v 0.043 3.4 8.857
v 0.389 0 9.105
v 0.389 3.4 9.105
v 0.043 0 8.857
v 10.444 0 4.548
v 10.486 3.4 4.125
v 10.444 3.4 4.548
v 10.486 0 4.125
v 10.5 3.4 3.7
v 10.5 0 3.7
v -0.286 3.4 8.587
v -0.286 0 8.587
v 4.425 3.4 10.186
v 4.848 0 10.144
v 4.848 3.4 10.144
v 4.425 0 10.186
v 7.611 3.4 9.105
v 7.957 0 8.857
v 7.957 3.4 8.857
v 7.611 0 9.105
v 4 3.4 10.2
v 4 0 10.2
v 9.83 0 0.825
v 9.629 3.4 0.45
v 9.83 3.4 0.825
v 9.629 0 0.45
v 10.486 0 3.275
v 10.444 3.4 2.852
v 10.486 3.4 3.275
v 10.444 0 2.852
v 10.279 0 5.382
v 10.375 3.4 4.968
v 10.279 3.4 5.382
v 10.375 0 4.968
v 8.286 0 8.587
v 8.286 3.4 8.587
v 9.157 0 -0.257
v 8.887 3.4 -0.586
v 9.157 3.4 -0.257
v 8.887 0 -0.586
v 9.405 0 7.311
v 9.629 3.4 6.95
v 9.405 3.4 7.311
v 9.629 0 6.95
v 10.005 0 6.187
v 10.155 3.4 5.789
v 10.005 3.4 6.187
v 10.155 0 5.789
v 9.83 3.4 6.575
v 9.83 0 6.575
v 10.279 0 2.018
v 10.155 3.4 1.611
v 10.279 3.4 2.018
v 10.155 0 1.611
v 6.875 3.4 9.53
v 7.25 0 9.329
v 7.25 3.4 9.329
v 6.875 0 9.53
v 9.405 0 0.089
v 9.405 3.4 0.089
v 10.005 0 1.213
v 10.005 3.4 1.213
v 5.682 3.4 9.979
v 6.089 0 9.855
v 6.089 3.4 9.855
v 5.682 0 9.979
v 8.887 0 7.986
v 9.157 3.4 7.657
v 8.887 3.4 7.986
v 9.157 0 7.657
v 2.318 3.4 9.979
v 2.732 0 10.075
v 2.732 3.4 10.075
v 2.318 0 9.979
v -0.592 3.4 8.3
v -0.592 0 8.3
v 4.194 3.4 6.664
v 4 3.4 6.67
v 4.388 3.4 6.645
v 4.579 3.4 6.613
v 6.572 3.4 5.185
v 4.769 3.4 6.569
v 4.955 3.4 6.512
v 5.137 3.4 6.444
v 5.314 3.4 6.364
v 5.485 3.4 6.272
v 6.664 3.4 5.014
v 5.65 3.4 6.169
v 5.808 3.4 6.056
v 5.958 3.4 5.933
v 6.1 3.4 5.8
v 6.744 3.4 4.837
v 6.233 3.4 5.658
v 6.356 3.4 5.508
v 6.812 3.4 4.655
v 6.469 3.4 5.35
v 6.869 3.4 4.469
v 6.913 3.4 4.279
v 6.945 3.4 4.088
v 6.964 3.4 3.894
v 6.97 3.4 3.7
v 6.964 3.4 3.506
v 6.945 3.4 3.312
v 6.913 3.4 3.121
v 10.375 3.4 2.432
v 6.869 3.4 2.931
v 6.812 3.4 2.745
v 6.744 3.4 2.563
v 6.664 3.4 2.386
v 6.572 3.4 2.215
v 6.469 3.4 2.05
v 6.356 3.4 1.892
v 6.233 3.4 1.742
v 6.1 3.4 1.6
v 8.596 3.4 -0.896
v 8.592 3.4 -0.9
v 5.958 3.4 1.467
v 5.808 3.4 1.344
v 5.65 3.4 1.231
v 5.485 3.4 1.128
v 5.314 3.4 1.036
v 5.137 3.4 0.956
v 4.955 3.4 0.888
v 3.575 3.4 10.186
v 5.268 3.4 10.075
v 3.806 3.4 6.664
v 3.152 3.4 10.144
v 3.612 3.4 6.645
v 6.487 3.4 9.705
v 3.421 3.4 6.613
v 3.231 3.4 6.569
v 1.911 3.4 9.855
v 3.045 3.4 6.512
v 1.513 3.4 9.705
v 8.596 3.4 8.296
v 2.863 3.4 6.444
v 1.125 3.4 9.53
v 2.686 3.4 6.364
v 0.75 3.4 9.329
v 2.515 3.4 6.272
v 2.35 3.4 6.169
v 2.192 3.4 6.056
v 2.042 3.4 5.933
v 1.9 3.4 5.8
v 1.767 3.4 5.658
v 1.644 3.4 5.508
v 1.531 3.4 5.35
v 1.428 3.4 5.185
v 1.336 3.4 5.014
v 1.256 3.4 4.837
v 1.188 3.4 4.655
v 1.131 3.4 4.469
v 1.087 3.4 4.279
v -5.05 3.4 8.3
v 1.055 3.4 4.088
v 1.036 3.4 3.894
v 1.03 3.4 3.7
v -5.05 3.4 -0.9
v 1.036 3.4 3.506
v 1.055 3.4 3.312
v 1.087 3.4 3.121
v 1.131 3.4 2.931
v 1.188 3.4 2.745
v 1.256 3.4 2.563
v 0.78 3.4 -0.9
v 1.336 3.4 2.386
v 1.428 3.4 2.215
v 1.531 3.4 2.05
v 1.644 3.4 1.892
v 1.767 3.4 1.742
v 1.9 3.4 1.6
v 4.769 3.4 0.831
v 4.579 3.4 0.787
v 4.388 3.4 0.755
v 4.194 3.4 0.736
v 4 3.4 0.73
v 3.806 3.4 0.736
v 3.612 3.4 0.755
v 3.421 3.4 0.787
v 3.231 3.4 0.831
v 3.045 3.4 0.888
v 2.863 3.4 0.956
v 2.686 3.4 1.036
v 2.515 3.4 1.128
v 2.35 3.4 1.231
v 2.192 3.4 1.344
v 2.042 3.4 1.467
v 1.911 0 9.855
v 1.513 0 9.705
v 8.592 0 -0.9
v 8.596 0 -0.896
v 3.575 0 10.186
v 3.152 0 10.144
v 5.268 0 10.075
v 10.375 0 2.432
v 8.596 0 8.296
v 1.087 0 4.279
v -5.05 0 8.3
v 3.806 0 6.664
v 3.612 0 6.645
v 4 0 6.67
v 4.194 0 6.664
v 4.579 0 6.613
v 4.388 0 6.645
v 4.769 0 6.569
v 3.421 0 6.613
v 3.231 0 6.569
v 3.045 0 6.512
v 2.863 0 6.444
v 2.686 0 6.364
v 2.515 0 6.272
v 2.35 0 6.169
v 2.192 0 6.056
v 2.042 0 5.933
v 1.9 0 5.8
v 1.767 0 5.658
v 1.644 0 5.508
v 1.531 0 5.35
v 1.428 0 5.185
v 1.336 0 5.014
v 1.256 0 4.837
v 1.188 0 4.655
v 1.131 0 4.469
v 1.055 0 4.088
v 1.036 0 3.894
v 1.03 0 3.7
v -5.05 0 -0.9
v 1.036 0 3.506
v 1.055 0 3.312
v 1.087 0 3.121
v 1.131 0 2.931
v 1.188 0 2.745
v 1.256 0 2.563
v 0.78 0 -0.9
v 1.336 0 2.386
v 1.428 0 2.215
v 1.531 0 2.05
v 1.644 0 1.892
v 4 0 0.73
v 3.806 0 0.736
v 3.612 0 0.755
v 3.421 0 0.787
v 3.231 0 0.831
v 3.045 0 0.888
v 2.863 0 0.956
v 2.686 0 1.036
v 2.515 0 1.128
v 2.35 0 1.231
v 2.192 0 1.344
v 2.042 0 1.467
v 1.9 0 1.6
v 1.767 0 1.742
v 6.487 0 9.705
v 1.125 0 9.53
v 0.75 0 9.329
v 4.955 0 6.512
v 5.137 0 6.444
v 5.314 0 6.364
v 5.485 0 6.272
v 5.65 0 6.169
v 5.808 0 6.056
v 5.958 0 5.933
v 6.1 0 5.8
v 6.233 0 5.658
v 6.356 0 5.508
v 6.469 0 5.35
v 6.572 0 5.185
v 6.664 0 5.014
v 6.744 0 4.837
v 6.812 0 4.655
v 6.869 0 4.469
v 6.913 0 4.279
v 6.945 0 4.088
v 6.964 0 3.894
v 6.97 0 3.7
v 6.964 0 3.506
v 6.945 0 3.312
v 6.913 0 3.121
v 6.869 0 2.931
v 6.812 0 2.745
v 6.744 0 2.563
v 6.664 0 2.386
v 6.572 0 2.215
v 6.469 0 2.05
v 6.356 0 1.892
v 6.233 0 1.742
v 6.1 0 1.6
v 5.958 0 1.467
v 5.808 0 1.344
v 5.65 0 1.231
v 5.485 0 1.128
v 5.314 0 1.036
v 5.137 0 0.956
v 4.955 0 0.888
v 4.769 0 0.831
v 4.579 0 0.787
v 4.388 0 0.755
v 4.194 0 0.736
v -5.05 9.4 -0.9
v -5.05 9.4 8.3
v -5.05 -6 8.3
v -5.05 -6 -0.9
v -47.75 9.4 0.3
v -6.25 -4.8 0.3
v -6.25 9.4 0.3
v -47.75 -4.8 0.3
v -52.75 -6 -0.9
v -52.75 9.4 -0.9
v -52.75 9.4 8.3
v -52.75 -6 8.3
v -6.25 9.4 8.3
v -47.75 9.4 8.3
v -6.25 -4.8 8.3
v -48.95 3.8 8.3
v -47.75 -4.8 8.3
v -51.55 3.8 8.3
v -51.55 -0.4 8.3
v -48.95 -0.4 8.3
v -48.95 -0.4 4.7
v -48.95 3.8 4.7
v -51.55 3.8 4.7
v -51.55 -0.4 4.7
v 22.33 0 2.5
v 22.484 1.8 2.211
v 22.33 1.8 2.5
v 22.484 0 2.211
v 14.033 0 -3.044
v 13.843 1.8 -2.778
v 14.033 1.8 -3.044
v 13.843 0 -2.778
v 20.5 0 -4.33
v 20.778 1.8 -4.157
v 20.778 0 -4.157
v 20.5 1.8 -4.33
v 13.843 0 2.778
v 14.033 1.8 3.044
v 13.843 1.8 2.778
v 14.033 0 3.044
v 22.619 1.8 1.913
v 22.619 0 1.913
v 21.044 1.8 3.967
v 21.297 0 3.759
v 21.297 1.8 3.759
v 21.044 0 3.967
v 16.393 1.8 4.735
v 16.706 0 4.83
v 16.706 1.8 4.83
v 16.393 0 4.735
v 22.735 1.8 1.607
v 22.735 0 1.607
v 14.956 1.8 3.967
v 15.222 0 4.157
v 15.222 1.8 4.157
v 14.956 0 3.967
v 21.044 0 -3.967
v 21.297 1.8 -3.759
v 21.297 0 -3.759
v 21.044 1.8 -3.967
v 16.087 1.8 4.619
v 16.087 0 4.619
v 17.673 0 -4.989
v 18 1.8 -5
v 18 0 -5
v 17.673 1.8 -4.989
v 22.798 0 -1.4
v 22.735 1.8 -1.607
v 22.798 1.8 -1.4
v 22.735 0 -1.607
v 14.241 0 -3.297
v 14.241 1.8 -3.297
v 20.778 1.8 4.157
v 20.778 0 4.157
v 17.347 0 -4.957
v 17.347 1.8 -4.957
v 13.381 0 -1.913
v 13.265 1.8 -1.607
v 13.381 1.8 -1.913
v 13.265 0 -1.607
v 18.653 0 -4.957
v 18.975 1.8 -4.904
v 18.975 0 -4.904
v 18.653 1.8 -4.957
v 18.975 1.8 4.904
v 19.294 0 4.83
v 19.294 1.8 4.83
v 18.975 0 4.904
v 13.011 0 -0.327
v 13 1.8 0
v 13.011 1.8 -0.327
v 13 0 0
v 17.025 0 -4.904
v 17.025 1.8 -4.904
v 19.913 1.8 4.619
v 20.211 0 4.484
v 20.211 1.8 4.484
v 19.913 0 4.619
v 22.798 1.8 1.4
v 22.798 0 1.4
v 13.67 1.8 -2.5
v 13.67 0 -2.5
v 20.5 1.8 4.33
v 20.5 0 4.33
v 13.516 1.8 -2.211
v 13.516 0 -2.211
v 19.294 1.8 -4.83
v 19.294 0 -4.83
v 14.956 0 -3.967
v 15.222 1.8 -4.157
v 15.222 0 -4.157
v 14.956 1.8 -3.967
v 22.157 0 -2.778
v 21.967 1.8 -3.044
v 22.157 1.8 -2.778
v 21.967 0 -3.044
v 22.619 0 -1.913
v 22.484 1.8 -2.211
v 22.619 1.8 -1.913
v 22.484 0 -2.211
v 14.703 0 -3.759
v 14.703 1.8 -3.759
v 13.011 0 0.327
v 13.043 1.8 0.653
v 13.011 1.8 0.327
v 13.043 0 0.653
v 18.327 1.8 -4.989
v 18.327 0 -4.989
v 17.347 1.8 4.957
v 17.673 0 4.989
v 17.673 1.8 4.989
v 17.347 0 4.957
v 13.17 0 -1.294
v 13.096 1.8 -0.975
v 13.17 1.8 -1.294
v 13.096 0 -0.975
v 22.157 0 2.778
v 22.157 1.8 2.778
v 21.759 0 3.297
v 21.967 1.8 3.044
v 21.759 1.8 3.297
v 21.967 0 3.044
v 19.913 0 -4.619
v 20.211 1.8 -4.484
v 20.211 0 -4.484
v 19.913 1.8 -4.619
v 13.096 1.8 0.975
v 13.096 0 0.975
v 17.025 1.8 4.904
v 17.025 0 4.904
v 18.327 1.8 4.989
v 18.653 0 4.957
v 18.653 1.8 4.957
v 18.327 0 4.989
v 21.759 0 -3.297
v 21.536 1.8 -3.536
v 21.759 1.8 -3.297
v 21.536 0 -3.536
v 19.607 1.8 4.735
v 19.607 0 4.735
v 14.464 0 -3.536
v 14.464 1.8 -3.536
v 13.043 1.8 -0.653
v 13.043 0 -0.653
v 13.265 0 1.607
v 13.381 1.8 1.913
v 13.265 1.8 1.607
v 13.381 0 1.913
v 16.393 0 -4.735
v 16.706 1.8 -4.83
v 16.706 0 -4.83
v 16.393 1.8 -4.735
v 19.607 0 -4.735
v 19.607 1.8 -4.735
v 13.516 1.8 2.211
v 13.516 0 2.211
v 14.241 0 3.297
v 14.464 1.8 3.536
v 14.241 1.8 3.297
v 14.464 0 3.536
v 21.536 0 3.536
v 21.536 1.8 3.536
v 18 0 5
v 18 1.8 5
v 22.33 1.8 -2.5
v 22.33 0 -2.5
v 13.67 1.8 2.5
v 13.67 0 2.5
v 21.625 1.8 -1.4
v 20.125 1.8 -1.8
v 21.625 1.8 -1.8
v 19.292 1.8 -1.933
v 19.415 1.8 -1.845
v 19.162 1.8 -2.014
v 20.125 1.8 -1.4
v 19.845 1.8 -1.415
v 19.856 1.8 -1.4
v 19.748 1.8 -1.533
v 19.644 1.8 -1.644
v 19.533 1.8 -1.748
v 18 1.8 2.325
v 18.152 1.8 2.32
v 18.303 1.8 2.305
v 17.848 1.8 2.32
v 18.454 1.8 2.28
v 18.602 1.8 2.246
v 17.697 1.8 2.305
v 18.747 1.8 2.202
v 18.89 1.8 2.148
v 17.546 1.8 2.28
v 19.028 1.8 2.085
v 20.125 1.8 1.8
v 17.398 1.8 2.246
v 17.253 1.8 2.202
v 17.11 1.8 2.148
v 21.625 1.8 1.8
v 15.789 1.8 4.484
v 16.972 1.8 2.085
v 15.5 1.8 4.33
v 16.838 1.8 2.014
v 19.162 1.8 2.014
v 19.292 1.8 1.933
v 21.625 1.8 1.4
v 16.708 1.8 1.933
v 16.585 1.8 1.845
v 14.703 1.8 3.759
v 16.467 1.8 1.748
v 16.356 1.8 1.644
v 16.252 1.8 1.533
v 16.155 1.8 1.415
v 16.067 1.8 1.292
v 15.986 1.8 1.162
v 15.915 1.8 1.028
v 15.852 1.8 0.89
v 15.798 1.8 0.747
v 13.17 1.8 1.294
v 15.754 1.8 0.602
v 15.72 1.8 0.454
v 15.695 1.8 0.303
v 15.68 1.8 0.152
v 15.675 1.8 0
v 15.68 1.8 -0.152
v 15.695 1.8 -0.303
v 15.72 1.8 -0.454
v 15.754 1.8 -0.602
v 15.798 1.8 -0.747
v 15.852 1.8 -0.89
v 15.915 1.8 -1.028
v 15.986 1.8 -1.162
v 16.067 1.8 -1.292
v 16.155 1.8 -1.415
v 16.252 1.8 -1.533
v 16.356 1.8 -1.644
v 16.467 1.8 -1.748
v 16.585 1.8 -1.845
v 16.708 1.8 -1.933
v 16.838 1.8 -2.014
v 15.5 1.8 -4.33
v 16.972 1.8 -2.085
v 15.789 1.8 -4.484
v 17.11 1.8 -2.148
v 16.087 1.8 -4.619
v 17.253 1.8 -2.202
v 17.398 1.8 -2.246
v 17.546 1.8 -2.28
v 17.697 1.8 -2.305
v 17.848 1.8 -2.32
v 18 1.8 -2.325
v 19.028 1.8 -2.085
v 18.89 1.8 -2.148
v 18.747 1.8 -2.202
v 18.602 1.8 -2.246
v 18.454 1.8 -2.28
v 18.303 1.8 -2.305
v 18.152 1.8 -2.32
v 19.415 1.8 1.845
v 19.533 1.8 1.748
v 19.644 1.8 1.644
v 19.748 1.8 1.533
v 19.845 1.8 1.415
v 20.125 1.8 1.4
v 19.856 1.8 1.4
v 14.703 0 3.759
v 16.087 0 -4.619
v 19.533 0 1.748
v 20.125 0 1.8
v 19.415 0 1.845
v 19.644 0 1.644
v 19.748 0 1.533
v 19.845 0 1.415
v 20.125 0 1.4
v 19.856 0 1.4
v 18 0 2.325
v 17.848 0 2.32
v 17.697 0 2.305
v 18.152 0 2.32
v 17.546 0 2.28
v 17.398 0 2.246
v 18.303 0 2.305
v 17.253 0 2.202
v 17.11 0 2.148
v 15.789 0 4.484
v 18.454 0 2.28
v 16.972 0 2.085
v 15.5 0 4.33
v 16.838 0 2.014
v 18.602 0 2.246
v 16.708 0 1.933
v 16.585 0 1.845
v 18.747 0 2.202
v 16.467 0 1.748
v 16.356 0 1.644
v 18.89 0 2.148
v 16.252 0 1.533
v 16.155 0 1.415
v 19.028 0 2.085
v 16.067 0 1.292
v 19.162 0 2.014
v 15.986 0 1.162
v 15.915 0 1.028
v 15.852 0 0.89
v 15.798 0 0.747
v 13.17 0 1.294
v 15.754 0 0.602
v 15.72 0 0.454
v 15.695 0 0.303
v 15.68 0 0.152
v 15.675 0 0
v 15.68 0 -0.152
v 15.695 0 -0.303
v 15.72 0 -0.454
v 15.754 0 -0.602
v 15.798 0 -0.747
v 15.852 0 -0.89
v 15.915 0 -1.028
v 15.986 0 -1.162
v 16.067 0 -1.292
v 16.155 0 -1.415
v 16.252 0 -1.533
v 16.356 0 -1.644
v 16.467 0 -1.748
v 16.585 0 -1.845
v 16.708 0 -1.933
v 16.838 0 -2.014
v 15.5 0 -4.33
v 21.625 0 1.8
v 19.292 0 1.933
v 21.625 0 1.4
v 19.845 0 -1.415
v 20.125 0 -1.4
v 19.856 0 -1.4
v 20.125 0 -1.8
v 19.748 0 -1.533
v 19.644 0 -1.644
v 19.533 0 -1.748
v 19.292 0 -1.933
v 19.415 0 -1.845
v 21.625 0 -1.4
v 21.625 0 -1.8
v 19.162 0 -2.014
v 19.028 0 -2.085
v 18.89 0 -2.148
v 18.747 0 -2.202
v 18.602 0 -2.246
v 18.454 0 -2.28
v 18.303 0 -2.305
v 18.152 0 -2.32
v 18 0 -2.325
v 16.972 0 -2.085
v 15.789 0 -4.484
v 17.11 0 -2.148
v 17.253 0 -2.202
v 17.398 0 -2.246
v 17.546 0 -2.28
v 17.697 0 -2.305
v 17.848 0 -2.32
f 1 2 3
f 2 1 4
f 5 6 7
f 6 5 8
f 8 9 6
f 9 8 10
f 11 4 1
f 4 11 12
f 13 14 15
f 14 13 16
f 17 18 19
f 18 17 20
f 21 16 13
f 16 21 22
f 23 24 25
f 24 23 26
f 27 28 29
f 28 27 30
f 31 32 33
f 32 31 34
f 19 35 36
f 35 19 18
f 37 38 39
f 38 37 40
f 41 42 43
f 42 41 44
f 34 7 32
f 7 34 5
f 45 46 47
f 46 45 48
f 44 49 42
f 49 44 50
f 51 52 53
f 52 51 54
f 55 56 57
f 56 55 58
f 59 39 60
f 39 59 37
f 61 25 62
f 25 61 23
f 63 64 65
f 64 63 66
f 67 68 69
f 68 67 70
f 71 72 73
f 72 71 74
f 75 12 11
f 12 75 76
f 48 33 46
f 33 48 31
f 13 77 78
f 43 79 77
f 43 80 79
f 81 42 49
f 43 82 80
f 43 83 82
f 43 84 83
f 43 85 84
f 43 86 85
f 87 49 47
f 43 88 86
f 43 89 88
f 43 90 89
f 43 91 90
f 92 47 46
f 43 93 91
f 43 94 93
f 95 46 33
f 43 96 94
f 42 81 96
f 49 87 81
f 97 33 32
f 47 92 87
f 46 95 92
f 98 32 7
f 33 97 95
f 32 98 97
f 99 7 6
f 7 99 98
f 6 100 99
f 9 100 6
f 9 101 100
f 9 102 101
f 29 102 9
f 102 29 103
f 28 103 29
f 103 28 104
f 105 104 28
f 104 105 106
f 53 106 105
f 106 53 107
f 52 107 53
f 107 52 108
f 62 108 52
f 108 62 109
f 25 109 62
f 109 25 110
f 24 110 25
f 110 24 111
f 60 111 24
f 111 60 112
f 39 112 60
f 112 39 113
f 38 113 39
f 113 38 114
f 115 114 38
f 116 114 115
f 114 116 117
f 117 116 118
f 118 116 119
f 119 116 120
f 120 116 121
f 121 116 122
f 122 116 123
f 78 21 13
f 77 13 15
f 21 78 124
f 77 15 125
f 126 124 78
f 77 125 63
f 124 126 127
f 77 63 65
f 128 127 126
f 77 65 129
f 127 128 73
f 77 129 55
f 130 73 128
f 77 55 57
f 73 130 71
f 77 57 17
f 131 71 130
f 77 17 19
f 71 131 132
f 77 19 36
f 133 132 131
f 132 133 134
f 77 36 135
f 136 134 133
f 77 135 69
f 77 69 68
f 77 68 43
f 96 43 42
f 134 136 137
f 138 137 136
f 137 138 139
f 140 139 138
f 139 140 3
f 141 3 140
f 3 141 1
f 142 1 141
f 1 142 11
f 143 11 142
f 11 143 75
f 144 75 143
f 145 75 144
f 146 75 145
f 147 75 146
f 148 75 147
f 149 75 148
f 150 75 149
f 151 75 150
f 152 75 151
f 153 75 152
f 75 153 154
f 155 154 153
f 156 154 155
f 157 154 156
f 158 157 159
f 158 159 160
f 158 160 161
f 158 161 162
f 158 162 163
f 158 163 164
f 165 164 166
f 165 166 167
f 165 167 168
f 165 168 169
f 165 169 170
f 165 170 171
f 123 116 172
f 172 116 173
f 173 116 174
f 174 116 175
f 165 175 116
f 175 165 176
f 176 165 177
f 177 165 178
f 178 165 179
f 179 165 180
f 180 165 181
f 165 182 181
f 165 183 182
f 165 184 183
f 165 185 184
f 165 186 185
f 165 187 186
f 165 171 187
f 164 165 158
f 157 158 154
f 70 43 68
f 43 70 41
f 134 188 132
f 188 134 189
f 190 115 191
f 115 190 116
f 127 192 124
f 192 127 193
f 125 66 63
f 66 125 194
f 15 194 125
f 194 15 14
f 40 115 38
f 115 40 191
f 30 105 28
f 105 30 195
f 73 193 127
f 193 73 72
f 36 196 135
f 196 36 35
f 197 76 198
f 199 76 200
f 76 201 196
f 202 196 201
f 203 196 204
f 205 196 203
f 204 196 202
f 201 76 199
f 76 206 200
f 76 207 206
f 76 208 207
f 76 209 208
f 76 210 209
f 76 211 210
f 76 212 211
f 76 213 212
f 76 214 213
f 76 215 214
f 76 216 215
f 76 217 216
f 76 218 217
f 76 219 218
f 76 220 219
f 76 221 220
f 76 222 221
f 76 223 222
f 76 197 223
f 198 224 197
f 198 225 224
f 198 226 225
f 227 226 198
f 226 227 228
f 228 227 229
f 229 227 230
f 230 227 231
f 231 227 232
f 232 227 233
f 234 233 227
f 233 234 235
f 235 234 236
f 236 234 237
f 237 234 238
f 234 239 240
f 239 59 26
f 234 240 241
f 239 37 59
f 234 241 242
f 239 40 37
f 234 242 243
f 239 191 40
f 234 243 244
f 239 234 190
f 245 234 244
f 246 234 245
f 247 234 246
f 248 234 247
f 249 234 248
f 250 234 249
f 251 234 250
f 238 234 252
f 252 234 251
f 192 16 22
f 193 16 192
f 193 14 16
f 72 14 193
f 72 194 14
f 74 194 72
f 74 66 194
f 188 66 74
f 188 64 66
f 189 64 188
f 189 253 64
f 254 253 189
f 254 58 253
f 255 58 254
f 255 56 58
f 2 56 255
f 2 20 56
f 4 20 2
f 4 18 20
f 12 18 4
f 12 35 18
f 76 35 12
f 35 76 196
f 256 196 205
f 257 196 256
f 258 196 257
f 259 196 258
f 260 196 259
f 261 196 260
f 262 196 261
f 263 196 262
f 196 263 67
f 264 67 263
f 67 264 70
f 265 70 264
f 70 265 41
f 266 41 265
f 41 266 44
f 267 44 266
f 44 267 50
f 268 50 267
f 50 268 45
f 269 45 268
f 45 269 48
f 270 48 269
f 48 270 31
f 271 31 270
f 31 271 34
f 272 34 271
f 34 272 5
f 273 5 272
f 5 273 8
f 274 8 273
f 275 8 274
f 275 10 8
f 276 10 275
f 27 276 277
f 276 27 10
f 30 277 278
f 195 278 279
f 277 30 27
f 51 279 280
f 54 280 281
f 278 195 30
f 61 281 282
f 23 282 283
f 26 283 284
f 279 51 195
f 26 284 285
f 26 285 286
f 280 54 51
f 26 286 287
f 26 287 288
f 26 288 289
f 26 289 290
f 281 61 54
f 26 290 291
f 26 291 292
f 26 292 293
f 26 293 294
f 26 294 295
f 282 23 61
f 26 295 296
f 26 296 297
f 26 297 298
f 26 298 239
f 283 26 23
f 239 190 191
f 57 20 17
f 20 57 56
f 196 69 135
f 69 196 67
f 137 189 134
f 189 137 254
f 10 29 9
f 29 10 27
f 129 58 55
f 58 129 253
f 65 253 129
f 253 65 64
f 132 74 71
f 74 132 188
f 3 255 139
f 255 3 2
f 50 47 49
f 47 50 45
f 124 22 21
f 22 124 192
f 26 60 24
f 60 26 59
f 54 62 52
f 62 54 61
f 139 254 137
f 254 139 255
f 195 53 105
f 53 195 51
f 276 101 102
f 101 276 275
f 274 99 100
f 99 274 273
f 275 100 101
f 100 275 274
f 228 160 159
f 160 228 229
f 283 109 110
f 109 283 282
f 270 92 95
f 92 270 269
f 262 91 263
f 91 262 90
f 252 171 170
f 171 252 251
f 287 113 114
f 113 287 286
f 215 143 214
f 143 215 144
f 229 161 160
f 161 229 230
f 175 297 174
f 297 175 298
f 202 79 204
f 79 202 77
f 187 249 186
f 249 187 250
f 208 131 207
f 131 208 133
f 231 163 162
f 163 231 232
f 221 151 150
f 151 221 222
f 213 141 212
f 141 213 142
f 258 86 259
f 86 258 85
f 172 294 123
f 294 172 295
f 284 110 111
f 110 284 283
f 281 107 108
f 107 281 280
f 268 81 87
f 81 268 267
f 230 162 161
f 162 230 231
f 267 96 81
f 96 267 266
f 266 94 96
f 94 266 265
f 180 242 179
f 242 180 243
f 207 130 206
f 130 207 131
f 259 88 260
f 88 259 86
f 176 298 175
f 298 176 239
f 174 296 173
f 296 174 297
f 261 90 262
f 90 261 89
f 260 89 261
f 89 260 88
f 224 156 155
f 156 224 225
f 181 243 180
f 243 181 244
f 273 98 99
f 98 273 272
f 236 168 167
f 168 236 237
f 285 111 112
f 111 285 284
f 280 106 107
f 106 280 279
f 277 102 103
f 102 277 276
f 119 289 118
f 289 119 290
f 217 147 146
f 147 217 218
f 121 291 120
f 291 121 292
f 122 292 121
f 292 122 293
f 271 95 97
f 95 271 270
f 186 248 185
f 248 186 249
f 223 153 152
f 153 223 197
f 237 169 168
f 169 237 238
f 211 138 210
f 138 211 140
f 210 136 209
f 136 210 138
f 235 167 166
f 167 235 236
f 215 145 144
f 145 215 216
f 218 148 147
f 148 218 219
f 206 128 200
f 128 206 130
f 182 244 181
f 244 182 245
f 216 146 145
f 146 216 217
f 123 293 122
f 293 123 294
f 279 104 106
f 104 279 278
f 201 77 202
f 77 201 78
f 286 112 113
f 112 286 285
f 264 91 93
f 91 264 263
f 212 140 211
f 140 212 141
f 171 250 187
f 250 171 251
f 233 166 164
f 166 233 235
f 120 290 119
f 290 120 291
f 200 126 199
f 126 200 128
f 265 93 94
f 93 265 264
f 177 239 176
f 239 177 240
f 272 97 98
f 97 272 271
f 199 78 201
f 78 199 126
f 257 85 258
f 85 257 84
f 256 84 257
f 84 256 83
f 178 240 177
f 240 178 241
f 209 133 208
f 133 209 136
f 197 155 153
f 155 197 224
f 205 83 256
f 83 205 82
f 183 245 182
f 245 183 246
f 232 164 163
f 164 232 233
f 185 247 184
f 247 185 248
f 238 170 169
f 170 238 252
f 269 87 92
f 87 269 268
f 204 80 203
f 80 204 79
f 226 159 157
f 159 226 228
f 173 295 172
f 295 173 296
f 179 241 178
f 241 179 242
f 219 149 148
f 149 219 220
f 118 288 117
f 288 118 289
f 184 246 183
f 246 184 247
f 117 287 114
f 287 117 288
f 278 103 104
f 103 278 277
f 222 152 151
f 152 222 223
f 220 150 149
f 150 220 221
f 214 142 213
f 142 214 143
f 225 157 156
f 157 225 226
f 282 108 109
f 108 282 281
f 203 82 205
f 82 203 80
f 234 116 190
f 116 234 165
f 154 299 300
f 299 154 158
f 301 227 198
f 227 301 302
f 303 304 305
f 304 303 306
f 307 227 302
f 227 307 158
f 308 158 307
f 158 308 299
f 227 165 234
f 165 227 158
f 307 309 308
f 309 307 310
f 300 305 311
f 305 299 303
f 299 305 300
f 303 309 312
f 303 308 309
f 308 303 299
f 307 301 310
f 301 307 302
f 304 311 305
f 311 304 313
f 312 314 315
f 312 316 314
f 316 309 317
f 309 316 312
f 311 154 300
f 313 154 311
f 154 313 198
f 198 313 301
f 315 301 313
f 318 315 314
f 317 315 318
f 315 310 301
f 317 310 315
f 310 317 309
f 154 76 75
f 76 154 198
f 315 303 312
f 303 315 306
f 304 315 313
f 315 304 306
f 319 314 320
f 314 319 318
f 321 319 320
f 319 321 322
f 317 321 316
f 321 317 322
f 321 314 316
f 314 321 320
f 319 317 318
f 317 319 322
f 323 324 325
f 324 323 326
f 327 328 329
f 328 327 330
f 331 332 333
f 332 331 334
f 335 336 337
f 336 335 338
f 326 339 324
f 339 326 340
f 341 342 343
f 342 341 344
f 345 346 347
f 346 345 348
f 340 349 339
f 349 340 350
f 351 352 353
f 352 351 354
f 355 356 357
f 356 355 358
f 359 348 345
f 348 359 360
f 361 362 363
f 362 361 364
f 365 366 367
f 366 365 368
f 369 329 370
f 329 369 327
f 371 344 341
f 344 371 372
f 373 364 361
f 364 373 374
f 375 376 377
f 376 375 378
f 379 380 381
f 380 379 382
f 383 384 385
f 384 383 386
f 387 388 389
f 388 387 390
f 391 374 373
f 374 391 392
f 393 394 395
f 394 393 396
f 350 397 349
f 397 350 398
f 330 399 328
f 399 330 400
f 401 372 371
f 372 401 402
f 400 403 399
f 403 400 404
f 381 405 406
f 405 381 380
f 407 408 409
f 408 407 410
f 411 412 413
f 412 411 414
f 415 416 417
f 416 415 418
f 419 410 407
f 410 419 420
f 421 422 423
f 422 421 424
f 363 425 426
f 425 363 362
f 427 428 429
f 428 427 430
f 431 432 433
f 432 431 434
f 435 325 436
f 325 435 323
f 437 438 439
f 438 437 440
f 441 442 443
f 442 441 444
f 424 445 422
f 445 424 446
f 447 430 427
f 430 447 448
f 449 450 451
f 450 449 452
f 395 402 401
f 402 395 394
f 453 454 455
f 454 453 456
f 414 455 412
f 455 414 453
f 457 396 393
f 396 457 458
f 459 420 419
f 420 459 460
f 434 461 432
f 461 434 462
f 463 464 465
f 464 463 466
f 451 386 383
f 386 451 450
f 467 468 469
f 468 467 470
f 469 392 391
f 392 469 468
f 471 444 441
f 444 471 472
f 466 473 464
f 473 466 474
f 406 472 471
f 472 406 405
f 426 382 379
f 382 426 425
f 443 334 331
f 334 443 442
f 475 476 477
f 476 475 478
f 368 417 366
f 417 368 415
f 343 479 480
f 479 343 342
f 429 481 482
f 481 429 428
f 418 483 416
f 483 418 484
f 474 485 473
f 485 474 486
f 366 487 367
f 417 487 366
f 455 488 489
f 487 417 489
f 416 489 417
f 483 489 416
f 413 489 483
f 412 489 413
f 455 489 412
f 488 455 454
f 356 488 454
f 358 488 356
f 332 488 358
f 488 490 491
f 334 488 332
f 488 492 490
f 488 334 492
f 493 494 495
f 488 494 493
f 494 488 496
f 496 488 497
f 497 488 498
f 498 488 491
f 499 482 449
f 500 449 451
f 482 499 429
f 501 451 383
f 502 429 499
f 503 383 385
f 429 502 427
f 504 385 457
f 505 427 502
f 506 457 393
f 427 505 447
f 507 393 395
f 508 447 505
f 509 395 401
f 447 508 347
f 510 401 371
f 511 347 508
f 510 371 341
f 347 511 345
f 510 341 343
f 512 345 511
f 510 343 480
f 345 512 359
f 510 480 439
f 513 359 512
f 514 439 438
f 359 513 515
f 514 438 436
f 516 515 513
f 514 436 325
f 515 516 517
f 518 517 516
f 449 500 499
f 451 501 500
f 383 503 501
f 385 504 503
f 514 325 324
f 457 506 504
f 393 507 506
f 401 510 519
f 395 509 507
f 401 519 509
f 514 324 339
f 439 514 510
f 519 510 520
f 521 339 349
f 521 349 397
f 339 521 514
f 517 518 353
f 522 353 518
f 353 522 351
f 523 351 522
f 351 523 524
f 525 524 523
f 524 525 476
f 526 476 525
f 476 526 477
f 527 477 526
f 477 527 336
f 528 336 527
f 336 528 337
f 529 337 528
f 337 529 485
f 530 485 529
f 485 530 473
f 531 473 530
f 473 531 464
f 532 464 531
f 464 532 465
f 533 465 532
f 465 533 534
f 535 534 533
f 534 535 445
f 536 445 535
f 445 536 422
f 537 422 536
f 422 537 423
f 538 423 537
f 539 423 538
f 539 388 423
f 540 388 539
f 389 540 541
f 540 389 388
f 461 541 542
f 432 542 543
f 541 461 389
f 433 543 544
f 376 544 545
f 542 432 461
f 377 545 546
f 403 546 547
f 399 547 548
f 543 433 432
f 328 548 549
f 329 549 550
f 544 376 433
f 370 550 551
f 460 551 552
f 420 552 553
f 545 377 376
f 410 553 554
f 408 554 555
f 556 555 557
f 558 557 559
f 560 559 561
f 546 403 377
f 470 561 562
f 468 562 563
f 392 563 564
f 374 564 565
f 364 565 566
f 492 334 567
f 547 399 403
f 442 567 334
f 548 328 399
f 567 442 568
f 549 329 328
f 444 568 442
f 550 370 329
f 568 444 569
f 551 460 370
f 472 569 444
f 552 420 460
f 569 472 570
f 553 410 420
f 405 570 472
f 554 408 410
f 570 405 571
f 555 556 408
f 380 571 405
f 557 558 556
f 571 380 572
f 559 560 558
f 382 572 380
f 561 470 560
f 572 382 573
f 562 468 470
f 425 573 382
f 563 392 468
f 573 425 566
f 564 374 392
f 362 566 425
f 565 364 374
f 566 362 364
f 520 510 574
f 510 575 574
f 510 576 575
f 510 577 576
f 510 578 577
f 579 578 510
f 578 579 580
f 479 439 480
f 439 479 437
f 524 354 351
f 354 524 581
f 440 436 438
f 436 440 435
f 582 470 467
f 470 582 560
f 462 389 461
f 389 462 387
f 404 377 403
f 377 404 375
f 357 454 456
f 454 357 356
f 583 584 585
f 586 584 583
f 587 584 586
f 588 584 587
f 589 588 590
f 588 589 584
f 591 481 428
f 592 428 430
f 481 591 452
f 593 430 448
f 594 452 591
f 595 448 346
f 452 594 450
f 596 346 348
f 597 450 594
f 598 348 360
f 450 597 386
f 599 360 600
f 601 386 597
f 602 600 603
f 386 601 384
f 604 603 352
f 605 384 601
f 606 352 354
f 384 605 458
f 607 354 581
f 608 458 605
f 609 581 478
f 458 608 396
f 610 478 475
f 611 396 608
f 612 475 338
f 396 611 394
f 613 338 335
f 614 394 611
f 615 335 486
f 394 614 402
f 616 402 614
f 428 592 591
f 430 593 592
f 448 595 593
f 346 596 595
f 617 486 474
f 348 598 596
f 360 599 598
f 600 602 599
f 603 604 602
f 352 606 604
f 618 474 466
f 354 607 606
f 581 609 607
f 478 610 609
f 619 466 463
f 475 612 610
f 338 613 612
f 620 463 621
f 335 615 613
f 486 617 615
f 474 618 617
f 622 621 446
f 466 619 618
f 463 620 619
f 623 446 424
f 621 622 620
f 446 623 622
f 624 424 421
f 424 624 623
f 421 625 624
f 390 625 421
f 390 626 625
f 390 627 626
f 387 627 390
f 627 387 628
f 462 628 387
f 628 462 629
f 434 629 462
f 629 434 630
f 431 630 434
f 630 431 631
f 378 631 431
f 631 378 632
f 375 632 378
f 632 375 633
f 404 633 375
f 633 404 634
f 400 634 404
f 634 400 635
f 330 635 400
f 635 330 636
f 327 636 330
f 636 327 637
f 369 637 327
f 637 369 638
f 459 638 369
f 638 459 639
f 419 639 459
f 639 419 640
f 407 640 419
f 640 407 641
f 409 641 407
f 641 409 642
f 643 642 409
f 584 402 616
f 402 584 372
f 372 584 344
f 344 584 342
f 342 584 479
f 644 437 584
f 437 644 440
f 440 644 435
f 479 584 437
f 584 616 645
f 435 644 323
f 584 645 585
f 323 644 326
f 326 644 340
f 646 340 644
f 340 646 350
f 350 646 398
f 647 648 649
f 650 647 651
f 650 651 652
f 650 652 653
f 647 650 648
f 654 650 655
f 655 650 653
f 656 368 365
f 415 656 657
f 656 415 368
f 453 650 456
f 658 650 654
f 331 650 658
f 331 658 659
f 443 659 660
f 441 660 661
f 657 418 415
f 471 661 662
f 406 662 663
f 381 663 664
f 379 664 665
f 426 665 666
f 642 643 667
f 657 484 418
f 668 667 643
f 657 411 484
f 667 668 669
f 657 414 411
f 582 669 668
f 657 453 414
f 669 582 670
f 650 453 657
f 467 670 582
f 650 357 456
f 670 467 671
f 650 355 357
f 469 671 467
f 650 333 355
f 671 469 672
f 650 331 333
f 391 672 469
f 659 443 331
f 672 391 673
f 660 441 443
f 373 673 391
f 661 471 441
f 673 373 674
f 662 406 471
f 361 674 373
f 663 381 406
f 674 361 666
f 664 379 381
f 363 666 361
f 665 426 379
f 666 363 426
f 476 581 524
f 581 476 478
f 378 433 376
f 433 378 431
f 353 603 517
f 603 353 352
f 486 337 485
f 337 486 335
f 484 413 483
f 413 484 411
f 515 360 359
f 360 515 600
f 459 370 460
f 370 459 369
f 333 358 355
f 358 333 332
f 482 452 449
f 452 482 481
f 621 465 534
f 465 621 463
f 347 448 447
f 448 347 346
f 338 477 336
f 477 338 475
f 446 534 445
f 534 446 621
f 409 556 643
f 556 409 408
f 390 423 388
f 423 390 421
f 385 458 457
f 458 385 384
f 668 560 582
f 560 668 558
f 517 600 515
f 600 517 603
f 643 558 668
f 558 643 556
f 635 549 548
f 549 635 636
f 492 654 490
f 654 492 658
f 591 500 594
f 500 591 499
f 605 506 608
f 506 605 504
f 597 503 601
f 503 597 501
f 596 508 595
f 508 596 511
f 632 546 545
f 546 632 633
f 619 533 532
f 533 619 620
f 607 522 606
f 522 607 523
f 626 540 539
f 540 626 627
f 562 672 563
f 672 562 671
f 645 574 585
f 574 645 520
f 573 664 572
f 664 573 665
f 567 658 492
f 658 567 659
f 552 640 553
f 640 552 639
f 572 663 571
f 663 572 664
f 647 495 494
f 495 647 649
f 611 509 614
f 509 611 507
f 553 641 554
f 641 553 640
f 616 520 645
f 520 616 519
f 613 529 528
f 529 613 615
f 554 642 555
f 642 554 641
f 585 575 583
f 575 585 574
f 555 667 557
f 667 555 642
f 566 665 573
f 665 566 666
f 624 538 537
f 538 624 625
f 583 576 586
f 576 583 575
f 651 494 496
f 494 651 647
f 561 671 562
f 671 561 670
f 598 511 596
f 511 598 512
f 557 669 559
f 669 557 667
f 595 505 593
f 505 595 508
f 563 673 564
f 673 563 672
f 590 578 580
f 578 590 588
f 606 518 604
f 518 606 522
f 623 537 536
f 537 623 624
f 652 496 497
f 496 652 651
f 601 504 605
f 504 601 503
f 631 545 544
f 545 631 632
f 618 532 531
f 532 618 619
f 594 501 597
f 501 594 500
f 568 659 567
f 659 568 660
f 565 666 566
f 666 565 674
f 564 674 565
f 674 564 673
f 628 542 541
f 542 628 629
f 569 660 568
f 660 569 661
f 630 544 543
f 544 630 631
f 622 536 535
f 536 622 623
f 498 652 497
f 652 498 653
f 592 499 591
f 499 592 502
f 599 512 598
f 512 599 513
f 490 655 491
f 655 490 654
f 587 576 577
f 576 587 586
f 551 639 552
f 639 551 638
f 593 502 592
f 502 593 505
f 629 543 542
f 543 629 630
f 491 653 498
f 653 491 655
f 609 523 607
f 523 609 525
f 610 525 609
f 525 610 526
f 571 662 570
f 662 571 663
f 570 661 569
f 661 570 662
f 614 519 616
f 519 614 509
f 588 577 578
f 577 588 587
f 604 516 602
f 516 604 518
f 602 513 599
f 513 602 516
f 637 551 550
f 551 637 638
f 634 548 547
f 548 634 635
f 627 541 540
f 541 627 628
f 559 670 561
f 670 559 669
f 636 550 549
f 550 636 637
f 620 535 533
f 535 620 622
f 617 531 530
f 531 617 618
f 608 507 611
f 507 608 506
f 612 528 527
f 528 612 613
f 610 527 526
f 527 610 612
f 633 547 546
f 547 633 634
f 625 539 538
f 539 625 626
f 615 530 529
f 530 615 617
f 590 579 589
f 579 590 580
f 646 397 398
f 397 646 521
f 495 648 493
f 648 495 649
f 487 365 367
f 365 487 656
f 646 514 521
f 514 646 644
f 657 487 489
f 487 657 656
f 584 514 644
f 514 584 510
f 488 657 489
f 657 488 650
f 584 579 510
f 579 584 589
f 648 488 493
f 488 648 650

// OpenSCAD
// DOUBLE TAKE FRAMES DESIGN RELEASE
// DTF_RELEASE: 2.0.3
// Released: 2026-09-04
// Versioning: Semantic Versioning 2.0.0 (https://semver.org/)
// Status: CANONICAL
// Changes in 2.0.3:
// - Carried forward unchanged for the corrected prepared-project packaging.
// Changes in 2.0.2:
// - Carried forward unchanged for the native 3MF packaging hotfix.
// Changes in 2.0.1:
// - Carried forward unchanged for the prepared-project packaging correction.
// Changes in 2.0.0:
// - Carried forward without geometry changes for the coordinated 2.0.0 release.
// Full release notes: https://doubletakeframes.com/build/#design-release
//
$fn = 96;

eps = 0.05;

// 0 = separated printable latch and keeper
// 1 = FN-weight latch only
// 2 = C-shaped keeper only
render_part = 0;

// =========================================================
// FN WEIGHT LATCH
// =========================================================
post_d = 5.5;
clear_radial = 0.22;
eye_inner_d = post_d + 2 * clear_radial;
eye_outer_d = 13.0;

latch_t = 3.4;
pivot_x = 4.0;

corral_clear_w_x = 41.5;
corral_clear_d_y = 13.0;
corral_wall_t = 1.2;
corral_depth_z = 8.0;
corral_floor_t = 1.2;
corral_end_wall_t_x = 5.0;
canonical_weight_center_x = -27.0;

// Match the installed latch plane used by the canonical dry-wall rig.
standoff_h = 0.8;
post_h = 4.0;
corral_global_outer_y1 = -0.30;
corral_center_y_target = corral_global_outer_y1
                         - (corral_clear_d_y + 2 * corral_wall_t) / 2;
pad_t = -corral_center_y_target - standoff_h - post_h / 2;
post_y1 = -pad_t - standoff_h - post_h;
latch_install_y = post_y1 + (post_h - latch_t) / 2;

corral_inner_x0 = canonical_weight_center_x - corral_clear_w_x / 2;
corral_inner_x1 = canonical_weight_center_x + corral_clear_w_x / 2;
corral_floor_x0 = corral_inner_x0 - corral_end_wall_t_x;
corral_floor_x1 = corral_inner_x1 + corral_wall_t;

corral_outer_y1 = corral_global_outer_y1 - latch_install_y;
corral_inner_y1 = corral_outer_y1 - corral_wall_t;
corral_inner_y0 = corral_inner_y1 - corral_clear_d_y;
corral_outer_y0 = corral_inner_y0 - corral_wall_t;

corral_floor_z0 = -0.90;
corral_floor_z = corral_floor_z0 + corral_floor_t;
corral_wall_z1 = corral_floor_z + corral_depth_z;
pivot_z = (corral_floor_z0 + corral_wall_z1) / 2;
pivot_eye_flat_local_z = corral_floor_z0 - pivot_z;

pivot_transition_x0 = corral_floor_x1;
pivot_transition_x1 = pivot_x - (eye_inner_d / 2 + 0.25);

// Far-end Y-retention socket. The matching roof-hung tooth belongs to the
// fixed dry-wall rig; this socket is open at the top so the latch disengages
// cleanly as it swings downward.
latch_key_tooth_w_x = 1.4;
latch_key_tooth_w_y = 3.0;
latch_key_clear_xy = 0.60;
latch_key_clear_z = 0.60;
latch_key_engagement_z = 3.0;

latch_key_xc = (corral_floor_x0 + corral_inner_x0) / 2;
latch_key_local_yc = (corral_outer_y0 + corral_outer_y1) / 2;
latch_key_notch_x0 = latch_key_xc - latch_key_tooth_w_x / 2
                     - latch_key_clear_xy;
latch_key_notch_x1 = latch_key_xc + latch_key_tooth_w_x / 2
                     + latch_key_clear_xy;
latch_key_notch_y0 = latch_key_local_yc - latch_key_tooth_w_y / 2
                     - latch_key_clear_xy;
latch_key_notch_y1 = latch_key_local_yc + latch_key_tooth_w_y / 2
                     + latch_key_clear_xy;
latch_key_notch_z0 = corral_wall_z1 - latch_key_engagement_z
                     - latch_key_clear_z;

// =========================================================
// C-SHAPED KEEPER
// =========================================================
clip_outer_d = 10.0;
clip_t = 1.8;
grip_hole_d = 4.65;
gap_w = 2.8;
flat_depth = 1.5;

// =========================================================
// HELPERS
// =========================================================
module rect_prism(x0, x1, y0, y1, z0, z1) {
    translate([min(x0, x1), min(y0, y1), min(z0, z1)])
        cube([abs(x1 - x0), abs(y1 - y0), abs(z1 - z0)]);
}

module cyl_y_span(d, y0, y1) {
    translate([0, max(y0, y1), 0])
        rotate([90, 0, 0])
            cylinder(d=d, h=abs(y1 - y0), center=false);
}

// =========================================================
// PRINTABLE PARTS
// =========================================================
module canonical_latch_core() {
    translate([pivot_x, 0, pivot_z])
        difference() {
            cyl_y_span(eye_outer_d, 0, latch_t);
            cyl_y_span(eye_inner_d, -0.1, latch_t + 0.2);

            // Flatten only the unused lower eye arc so the complete latch
            // prints on the same plane as the corral floor.
            rect_prism(-eye_outer_d / 2 - 1,
                       eye_outer_d / 2 + 1,
                       -0.1, latch_t + 0.2,
                       -eye_outer_d / 2 - 1,
                       pivot_eye_flat_local_z);
        }
}

module fn_weight_corral() {
    difference() {
        union() {
            // Shallow floor beneath the weight pocket and keyed extension.
            rect_prism(corral_floor_x0, corral_floor_x1,
                       corral_outer_y0, corral_outer_y1,
                       corral_floor_z0, corral_floor_z);

            // Viewer-facing wall. The frame wall closes the opposite side.
            rect_prism(corral_inner_x0, corral_inner_x1,
                       corral_outer_y0, corral_inner_y0,
                       corral_floor_z, corral_wall_z1);

            // Pivot-side wall.
            rect_prism(corral_inner_x1, corral_floor_x1,
                       corral_outer_y0, corral_outer_y1,
                       corral_floor_z, corral_wall_z1);

            // Substantial far-end wall carrying the retention socket.
            rect_prism(corral_floor_x0, corral_inner_x0,
                       corral_outer_y0, corral_outer_y1,
                       corral_floor_z, corral_wall_z1);

            // Compact load path from the corral into the pivot eye.
            rect_prism(pivot_transition_x0, pivot_transition_x1,
                       0, latch_t,
                       corral_floor_z0, corral_wall_z1);
        }

        rect_prism(latch_key_notch_x0, latch_key_notch_x1,
                   latch_key_notch_y0, latch_key_notch_y1,
                   latch_key_notch_z0, corral_wall_z1 + eps);
    }
}

module swinging_latch() {
    union() {
        canonical_latch_core();
        fn_weight_corral();
    }
}

module c_keeper() {
    difference() {
        cyl_y_span(clip_outer_d, 0, clip_t);
        cyl_y_span(grip_hole_d, -0.1, clip_t + 0.2);

        rect_prism(0, clip_outer_d / 2 + 0.5,
                   -0.1, clip_t + 0.1,
                   -gap_w / 2, gap_w / 2);

        rect_prism(grip_hole_d / 2 - 0.2,
                   grip_hole_d / 2 - 0.2 + flat_depth,
                   -0.1, clip_t + 0.1,
                   -gap_w / 2 - 0.4, gap_w / 2 + 0.4);
    }
}

assert(corral_clear_w_x == 41.5);
assert(corral_clear_d_y == 13.0);
assert(pivot_transition_x1 > pivot_transition_x0);

if (render_part == 1)
    swinging_latch();
else if (render_part == 2)
    c_keeper();
else {
    swinging_latch();
    translate([18, 0, 0]) c_keeper();
}
